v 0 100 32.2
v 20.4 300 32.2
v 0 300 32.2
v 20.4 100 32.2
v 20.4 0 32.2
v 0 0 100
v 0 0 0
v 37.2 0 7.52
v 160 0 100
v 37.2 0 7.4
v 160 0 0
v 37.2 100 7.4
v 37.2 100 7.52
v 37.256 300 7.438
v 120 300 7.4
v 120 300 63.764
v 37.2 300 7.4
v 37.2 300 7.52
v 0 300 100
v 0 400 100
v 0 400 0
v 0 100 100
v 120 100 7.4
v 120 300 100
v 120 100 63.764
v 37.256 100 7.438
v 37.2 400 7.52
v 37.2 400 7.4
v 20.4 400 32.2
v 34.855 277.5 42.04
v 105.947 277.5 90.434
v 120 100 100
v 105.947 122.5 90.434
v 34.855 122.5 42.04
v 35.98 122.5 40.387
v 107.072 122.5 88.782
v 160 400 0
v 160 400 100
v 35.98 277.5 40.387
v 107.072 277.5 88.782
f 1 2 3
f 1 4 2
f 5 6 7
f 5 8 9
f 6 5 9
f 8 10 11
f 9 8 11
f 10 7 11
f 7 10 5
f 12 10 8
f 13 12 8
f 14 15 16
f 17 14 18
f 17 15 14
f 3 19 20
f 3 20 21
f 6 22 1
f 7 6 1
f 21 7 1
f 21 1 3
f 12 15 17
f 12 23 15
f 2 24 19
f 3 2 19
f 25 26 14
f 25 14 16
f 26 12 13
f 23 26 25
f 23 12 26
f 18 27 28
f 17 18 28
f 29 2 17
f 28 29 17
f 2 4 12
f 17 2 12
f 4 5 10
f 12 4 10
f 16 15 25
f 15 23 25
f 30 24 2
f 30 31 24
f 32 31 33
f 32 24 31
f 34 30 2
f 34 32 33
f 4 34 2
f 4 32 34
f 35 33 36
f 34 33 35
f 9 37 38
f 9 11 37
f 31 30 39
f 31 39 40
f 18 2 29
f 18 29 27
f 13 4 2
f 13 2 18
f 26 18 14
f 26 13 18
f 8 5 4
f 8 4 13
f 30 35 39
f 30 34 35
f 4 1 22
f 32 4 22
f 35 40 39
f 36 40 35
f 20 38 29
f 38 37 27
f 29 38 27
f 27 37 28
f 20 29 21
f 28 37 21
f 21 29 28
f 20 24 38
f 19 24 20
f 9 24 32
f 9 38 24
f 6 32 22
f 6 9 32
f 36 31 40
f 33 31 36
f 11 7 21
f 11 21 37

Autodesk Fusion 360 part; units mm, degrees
sketch "Esquisse1" plane through (0, 0, 0) normal (0, 1, 0) x (1, 0, 0)
  line L0 (0, 0) -> (120, 0)
  line L1 (120, 0) -> (120, -100)
  line L2 (120, -100) -> (0, -100)
  line L3 (0, -100) -> (0, 0)
  line L4 (0, 0) -> (37.2, 0)
  line L5 (37.2, 0) -> (37.2, -32.2)
  line L6 (37.2, -32.2) -> (0, -32.2)
  line L7 (0, -32.2) -> (0, 0)
  line L8 (37.2, -32.2) -> (20.4, -32.2)
  line L9 (37.2, -7.4) -> (37.2, -32.2)
  line L10 (20.4, -32.2) -> (37.2, -7.4)
  line L11 (120, -100) -> (20.4, -32.2)
  line L12 (20.4, -32.2) -> (37.256, -7.4381)
  line L13 (37.256, -7.4381) -> (136.856, -75.2381)
  line L14 (136.856, -75.2381) -> (120, -100)
  line L15 (120, -100) -> (120, 0)
  line L16 (120, 0) -> (160, 0)
  line L17 (160, 0) -> (160, -100)
  line L18 (160, -100) -> (120, -100)
  line L19 (37.2, -7.4) -> (37.2, 0)
  line L20 (37.2, 0) -> (160, 0)
  line L21 (160, 0) -> (160, -7.4)
  line L22 (160, -7.4) -> (37.2, -7.4)
  line L23 (160, -7.4) -> (160, -100)
  line L24 (160, -100) -> (120, -100)
  line L25 (120, -100) -> (120, -7.4)
  line L26 (120, -7.4) -> (160, -7.4)
  dimension "d1" = 120
  dimension "d2" = 100
  dimension "d3" = 37.2
  dimension "d4" = 32.2
  dimension "d11" = 16.8
  dimension "d12" = 24.8
  dimension "d19" = 40
extrude "Extrusion3" add sketch "Esquisse1" along normal blind 200 contours L0 L3 L4 L5 L6 L7 L10 L19 | L0 L1 L5 L15 L19 L20 L22 | L1 L15 L16 L17 L20 L21 L22 L26 | L5 L6 L8 L9 L12 | L1 L5 L6 L8 L9 L11 L12 L13 L15 L25 | L1 L13 L14 L15 L17 L18 L22 L23 L24 L25 L26 | L1 L13 L14 L15 L25
extrude "Extrusion4" add sketch "Esquisse1" along normal blind 100 contours L0 L1 L5 L15 L19 L20 L22 | L2 L3 L6 L11 | L1 L15 L16 L17 L20 L21 L22 L26 | L1 L5 L9 L12 L13 L15 L22 L25 | L1 L13 L14 L15 L17 L18 L22 L23 L24 L25 L26
mirror "Symétrie miroir2" about plane through (0, 200, 0) normal (0, 1, 0) of bodies 1 merged
sketch "Esquisse3" plane through (-8.5188, 0, 12.5143) normal (-0.5627, 0, 0.8266) x (0, -1, 0)
  line L0 (-100, 34.9832) -> (-100, 155.4697)
  line L1 (-100, 155.4697) -> (-300, 155.4697)
  line L2 (-300, 155.4697) -> (-300, 34.9832)
  line L3 (-300, 34.9832) -> (-100, 34.9832)
  line L4 (-277.5, 138.4697) -> (-122.5, 138.4697)
  line L5 (-122.5, 138.4697) -> (-122.5, 52.4697)
  line L6 (-122.5, 52.4697) -> (-277.5, 52.4697)
  line L7 (-277.5, 52.4697) -> (-277.5, 138.4697)
  line L8 (-277.5, 138.4697) -> (-122.5, 52.4697) construction
  line L9 (-122.5, 138.4697) -> (-277.5, 52.4697) construction
  point P0 (-200, 95.4697)
  dimension "d22" = 155
  dimension "d23" = 86
  dimension "d24" = 22.5
  dimension "d25" = 17
extrude "Extrusion6" cut sketch "Esquisse3" against normal blind 2 contours L4 L5 L6 L7
